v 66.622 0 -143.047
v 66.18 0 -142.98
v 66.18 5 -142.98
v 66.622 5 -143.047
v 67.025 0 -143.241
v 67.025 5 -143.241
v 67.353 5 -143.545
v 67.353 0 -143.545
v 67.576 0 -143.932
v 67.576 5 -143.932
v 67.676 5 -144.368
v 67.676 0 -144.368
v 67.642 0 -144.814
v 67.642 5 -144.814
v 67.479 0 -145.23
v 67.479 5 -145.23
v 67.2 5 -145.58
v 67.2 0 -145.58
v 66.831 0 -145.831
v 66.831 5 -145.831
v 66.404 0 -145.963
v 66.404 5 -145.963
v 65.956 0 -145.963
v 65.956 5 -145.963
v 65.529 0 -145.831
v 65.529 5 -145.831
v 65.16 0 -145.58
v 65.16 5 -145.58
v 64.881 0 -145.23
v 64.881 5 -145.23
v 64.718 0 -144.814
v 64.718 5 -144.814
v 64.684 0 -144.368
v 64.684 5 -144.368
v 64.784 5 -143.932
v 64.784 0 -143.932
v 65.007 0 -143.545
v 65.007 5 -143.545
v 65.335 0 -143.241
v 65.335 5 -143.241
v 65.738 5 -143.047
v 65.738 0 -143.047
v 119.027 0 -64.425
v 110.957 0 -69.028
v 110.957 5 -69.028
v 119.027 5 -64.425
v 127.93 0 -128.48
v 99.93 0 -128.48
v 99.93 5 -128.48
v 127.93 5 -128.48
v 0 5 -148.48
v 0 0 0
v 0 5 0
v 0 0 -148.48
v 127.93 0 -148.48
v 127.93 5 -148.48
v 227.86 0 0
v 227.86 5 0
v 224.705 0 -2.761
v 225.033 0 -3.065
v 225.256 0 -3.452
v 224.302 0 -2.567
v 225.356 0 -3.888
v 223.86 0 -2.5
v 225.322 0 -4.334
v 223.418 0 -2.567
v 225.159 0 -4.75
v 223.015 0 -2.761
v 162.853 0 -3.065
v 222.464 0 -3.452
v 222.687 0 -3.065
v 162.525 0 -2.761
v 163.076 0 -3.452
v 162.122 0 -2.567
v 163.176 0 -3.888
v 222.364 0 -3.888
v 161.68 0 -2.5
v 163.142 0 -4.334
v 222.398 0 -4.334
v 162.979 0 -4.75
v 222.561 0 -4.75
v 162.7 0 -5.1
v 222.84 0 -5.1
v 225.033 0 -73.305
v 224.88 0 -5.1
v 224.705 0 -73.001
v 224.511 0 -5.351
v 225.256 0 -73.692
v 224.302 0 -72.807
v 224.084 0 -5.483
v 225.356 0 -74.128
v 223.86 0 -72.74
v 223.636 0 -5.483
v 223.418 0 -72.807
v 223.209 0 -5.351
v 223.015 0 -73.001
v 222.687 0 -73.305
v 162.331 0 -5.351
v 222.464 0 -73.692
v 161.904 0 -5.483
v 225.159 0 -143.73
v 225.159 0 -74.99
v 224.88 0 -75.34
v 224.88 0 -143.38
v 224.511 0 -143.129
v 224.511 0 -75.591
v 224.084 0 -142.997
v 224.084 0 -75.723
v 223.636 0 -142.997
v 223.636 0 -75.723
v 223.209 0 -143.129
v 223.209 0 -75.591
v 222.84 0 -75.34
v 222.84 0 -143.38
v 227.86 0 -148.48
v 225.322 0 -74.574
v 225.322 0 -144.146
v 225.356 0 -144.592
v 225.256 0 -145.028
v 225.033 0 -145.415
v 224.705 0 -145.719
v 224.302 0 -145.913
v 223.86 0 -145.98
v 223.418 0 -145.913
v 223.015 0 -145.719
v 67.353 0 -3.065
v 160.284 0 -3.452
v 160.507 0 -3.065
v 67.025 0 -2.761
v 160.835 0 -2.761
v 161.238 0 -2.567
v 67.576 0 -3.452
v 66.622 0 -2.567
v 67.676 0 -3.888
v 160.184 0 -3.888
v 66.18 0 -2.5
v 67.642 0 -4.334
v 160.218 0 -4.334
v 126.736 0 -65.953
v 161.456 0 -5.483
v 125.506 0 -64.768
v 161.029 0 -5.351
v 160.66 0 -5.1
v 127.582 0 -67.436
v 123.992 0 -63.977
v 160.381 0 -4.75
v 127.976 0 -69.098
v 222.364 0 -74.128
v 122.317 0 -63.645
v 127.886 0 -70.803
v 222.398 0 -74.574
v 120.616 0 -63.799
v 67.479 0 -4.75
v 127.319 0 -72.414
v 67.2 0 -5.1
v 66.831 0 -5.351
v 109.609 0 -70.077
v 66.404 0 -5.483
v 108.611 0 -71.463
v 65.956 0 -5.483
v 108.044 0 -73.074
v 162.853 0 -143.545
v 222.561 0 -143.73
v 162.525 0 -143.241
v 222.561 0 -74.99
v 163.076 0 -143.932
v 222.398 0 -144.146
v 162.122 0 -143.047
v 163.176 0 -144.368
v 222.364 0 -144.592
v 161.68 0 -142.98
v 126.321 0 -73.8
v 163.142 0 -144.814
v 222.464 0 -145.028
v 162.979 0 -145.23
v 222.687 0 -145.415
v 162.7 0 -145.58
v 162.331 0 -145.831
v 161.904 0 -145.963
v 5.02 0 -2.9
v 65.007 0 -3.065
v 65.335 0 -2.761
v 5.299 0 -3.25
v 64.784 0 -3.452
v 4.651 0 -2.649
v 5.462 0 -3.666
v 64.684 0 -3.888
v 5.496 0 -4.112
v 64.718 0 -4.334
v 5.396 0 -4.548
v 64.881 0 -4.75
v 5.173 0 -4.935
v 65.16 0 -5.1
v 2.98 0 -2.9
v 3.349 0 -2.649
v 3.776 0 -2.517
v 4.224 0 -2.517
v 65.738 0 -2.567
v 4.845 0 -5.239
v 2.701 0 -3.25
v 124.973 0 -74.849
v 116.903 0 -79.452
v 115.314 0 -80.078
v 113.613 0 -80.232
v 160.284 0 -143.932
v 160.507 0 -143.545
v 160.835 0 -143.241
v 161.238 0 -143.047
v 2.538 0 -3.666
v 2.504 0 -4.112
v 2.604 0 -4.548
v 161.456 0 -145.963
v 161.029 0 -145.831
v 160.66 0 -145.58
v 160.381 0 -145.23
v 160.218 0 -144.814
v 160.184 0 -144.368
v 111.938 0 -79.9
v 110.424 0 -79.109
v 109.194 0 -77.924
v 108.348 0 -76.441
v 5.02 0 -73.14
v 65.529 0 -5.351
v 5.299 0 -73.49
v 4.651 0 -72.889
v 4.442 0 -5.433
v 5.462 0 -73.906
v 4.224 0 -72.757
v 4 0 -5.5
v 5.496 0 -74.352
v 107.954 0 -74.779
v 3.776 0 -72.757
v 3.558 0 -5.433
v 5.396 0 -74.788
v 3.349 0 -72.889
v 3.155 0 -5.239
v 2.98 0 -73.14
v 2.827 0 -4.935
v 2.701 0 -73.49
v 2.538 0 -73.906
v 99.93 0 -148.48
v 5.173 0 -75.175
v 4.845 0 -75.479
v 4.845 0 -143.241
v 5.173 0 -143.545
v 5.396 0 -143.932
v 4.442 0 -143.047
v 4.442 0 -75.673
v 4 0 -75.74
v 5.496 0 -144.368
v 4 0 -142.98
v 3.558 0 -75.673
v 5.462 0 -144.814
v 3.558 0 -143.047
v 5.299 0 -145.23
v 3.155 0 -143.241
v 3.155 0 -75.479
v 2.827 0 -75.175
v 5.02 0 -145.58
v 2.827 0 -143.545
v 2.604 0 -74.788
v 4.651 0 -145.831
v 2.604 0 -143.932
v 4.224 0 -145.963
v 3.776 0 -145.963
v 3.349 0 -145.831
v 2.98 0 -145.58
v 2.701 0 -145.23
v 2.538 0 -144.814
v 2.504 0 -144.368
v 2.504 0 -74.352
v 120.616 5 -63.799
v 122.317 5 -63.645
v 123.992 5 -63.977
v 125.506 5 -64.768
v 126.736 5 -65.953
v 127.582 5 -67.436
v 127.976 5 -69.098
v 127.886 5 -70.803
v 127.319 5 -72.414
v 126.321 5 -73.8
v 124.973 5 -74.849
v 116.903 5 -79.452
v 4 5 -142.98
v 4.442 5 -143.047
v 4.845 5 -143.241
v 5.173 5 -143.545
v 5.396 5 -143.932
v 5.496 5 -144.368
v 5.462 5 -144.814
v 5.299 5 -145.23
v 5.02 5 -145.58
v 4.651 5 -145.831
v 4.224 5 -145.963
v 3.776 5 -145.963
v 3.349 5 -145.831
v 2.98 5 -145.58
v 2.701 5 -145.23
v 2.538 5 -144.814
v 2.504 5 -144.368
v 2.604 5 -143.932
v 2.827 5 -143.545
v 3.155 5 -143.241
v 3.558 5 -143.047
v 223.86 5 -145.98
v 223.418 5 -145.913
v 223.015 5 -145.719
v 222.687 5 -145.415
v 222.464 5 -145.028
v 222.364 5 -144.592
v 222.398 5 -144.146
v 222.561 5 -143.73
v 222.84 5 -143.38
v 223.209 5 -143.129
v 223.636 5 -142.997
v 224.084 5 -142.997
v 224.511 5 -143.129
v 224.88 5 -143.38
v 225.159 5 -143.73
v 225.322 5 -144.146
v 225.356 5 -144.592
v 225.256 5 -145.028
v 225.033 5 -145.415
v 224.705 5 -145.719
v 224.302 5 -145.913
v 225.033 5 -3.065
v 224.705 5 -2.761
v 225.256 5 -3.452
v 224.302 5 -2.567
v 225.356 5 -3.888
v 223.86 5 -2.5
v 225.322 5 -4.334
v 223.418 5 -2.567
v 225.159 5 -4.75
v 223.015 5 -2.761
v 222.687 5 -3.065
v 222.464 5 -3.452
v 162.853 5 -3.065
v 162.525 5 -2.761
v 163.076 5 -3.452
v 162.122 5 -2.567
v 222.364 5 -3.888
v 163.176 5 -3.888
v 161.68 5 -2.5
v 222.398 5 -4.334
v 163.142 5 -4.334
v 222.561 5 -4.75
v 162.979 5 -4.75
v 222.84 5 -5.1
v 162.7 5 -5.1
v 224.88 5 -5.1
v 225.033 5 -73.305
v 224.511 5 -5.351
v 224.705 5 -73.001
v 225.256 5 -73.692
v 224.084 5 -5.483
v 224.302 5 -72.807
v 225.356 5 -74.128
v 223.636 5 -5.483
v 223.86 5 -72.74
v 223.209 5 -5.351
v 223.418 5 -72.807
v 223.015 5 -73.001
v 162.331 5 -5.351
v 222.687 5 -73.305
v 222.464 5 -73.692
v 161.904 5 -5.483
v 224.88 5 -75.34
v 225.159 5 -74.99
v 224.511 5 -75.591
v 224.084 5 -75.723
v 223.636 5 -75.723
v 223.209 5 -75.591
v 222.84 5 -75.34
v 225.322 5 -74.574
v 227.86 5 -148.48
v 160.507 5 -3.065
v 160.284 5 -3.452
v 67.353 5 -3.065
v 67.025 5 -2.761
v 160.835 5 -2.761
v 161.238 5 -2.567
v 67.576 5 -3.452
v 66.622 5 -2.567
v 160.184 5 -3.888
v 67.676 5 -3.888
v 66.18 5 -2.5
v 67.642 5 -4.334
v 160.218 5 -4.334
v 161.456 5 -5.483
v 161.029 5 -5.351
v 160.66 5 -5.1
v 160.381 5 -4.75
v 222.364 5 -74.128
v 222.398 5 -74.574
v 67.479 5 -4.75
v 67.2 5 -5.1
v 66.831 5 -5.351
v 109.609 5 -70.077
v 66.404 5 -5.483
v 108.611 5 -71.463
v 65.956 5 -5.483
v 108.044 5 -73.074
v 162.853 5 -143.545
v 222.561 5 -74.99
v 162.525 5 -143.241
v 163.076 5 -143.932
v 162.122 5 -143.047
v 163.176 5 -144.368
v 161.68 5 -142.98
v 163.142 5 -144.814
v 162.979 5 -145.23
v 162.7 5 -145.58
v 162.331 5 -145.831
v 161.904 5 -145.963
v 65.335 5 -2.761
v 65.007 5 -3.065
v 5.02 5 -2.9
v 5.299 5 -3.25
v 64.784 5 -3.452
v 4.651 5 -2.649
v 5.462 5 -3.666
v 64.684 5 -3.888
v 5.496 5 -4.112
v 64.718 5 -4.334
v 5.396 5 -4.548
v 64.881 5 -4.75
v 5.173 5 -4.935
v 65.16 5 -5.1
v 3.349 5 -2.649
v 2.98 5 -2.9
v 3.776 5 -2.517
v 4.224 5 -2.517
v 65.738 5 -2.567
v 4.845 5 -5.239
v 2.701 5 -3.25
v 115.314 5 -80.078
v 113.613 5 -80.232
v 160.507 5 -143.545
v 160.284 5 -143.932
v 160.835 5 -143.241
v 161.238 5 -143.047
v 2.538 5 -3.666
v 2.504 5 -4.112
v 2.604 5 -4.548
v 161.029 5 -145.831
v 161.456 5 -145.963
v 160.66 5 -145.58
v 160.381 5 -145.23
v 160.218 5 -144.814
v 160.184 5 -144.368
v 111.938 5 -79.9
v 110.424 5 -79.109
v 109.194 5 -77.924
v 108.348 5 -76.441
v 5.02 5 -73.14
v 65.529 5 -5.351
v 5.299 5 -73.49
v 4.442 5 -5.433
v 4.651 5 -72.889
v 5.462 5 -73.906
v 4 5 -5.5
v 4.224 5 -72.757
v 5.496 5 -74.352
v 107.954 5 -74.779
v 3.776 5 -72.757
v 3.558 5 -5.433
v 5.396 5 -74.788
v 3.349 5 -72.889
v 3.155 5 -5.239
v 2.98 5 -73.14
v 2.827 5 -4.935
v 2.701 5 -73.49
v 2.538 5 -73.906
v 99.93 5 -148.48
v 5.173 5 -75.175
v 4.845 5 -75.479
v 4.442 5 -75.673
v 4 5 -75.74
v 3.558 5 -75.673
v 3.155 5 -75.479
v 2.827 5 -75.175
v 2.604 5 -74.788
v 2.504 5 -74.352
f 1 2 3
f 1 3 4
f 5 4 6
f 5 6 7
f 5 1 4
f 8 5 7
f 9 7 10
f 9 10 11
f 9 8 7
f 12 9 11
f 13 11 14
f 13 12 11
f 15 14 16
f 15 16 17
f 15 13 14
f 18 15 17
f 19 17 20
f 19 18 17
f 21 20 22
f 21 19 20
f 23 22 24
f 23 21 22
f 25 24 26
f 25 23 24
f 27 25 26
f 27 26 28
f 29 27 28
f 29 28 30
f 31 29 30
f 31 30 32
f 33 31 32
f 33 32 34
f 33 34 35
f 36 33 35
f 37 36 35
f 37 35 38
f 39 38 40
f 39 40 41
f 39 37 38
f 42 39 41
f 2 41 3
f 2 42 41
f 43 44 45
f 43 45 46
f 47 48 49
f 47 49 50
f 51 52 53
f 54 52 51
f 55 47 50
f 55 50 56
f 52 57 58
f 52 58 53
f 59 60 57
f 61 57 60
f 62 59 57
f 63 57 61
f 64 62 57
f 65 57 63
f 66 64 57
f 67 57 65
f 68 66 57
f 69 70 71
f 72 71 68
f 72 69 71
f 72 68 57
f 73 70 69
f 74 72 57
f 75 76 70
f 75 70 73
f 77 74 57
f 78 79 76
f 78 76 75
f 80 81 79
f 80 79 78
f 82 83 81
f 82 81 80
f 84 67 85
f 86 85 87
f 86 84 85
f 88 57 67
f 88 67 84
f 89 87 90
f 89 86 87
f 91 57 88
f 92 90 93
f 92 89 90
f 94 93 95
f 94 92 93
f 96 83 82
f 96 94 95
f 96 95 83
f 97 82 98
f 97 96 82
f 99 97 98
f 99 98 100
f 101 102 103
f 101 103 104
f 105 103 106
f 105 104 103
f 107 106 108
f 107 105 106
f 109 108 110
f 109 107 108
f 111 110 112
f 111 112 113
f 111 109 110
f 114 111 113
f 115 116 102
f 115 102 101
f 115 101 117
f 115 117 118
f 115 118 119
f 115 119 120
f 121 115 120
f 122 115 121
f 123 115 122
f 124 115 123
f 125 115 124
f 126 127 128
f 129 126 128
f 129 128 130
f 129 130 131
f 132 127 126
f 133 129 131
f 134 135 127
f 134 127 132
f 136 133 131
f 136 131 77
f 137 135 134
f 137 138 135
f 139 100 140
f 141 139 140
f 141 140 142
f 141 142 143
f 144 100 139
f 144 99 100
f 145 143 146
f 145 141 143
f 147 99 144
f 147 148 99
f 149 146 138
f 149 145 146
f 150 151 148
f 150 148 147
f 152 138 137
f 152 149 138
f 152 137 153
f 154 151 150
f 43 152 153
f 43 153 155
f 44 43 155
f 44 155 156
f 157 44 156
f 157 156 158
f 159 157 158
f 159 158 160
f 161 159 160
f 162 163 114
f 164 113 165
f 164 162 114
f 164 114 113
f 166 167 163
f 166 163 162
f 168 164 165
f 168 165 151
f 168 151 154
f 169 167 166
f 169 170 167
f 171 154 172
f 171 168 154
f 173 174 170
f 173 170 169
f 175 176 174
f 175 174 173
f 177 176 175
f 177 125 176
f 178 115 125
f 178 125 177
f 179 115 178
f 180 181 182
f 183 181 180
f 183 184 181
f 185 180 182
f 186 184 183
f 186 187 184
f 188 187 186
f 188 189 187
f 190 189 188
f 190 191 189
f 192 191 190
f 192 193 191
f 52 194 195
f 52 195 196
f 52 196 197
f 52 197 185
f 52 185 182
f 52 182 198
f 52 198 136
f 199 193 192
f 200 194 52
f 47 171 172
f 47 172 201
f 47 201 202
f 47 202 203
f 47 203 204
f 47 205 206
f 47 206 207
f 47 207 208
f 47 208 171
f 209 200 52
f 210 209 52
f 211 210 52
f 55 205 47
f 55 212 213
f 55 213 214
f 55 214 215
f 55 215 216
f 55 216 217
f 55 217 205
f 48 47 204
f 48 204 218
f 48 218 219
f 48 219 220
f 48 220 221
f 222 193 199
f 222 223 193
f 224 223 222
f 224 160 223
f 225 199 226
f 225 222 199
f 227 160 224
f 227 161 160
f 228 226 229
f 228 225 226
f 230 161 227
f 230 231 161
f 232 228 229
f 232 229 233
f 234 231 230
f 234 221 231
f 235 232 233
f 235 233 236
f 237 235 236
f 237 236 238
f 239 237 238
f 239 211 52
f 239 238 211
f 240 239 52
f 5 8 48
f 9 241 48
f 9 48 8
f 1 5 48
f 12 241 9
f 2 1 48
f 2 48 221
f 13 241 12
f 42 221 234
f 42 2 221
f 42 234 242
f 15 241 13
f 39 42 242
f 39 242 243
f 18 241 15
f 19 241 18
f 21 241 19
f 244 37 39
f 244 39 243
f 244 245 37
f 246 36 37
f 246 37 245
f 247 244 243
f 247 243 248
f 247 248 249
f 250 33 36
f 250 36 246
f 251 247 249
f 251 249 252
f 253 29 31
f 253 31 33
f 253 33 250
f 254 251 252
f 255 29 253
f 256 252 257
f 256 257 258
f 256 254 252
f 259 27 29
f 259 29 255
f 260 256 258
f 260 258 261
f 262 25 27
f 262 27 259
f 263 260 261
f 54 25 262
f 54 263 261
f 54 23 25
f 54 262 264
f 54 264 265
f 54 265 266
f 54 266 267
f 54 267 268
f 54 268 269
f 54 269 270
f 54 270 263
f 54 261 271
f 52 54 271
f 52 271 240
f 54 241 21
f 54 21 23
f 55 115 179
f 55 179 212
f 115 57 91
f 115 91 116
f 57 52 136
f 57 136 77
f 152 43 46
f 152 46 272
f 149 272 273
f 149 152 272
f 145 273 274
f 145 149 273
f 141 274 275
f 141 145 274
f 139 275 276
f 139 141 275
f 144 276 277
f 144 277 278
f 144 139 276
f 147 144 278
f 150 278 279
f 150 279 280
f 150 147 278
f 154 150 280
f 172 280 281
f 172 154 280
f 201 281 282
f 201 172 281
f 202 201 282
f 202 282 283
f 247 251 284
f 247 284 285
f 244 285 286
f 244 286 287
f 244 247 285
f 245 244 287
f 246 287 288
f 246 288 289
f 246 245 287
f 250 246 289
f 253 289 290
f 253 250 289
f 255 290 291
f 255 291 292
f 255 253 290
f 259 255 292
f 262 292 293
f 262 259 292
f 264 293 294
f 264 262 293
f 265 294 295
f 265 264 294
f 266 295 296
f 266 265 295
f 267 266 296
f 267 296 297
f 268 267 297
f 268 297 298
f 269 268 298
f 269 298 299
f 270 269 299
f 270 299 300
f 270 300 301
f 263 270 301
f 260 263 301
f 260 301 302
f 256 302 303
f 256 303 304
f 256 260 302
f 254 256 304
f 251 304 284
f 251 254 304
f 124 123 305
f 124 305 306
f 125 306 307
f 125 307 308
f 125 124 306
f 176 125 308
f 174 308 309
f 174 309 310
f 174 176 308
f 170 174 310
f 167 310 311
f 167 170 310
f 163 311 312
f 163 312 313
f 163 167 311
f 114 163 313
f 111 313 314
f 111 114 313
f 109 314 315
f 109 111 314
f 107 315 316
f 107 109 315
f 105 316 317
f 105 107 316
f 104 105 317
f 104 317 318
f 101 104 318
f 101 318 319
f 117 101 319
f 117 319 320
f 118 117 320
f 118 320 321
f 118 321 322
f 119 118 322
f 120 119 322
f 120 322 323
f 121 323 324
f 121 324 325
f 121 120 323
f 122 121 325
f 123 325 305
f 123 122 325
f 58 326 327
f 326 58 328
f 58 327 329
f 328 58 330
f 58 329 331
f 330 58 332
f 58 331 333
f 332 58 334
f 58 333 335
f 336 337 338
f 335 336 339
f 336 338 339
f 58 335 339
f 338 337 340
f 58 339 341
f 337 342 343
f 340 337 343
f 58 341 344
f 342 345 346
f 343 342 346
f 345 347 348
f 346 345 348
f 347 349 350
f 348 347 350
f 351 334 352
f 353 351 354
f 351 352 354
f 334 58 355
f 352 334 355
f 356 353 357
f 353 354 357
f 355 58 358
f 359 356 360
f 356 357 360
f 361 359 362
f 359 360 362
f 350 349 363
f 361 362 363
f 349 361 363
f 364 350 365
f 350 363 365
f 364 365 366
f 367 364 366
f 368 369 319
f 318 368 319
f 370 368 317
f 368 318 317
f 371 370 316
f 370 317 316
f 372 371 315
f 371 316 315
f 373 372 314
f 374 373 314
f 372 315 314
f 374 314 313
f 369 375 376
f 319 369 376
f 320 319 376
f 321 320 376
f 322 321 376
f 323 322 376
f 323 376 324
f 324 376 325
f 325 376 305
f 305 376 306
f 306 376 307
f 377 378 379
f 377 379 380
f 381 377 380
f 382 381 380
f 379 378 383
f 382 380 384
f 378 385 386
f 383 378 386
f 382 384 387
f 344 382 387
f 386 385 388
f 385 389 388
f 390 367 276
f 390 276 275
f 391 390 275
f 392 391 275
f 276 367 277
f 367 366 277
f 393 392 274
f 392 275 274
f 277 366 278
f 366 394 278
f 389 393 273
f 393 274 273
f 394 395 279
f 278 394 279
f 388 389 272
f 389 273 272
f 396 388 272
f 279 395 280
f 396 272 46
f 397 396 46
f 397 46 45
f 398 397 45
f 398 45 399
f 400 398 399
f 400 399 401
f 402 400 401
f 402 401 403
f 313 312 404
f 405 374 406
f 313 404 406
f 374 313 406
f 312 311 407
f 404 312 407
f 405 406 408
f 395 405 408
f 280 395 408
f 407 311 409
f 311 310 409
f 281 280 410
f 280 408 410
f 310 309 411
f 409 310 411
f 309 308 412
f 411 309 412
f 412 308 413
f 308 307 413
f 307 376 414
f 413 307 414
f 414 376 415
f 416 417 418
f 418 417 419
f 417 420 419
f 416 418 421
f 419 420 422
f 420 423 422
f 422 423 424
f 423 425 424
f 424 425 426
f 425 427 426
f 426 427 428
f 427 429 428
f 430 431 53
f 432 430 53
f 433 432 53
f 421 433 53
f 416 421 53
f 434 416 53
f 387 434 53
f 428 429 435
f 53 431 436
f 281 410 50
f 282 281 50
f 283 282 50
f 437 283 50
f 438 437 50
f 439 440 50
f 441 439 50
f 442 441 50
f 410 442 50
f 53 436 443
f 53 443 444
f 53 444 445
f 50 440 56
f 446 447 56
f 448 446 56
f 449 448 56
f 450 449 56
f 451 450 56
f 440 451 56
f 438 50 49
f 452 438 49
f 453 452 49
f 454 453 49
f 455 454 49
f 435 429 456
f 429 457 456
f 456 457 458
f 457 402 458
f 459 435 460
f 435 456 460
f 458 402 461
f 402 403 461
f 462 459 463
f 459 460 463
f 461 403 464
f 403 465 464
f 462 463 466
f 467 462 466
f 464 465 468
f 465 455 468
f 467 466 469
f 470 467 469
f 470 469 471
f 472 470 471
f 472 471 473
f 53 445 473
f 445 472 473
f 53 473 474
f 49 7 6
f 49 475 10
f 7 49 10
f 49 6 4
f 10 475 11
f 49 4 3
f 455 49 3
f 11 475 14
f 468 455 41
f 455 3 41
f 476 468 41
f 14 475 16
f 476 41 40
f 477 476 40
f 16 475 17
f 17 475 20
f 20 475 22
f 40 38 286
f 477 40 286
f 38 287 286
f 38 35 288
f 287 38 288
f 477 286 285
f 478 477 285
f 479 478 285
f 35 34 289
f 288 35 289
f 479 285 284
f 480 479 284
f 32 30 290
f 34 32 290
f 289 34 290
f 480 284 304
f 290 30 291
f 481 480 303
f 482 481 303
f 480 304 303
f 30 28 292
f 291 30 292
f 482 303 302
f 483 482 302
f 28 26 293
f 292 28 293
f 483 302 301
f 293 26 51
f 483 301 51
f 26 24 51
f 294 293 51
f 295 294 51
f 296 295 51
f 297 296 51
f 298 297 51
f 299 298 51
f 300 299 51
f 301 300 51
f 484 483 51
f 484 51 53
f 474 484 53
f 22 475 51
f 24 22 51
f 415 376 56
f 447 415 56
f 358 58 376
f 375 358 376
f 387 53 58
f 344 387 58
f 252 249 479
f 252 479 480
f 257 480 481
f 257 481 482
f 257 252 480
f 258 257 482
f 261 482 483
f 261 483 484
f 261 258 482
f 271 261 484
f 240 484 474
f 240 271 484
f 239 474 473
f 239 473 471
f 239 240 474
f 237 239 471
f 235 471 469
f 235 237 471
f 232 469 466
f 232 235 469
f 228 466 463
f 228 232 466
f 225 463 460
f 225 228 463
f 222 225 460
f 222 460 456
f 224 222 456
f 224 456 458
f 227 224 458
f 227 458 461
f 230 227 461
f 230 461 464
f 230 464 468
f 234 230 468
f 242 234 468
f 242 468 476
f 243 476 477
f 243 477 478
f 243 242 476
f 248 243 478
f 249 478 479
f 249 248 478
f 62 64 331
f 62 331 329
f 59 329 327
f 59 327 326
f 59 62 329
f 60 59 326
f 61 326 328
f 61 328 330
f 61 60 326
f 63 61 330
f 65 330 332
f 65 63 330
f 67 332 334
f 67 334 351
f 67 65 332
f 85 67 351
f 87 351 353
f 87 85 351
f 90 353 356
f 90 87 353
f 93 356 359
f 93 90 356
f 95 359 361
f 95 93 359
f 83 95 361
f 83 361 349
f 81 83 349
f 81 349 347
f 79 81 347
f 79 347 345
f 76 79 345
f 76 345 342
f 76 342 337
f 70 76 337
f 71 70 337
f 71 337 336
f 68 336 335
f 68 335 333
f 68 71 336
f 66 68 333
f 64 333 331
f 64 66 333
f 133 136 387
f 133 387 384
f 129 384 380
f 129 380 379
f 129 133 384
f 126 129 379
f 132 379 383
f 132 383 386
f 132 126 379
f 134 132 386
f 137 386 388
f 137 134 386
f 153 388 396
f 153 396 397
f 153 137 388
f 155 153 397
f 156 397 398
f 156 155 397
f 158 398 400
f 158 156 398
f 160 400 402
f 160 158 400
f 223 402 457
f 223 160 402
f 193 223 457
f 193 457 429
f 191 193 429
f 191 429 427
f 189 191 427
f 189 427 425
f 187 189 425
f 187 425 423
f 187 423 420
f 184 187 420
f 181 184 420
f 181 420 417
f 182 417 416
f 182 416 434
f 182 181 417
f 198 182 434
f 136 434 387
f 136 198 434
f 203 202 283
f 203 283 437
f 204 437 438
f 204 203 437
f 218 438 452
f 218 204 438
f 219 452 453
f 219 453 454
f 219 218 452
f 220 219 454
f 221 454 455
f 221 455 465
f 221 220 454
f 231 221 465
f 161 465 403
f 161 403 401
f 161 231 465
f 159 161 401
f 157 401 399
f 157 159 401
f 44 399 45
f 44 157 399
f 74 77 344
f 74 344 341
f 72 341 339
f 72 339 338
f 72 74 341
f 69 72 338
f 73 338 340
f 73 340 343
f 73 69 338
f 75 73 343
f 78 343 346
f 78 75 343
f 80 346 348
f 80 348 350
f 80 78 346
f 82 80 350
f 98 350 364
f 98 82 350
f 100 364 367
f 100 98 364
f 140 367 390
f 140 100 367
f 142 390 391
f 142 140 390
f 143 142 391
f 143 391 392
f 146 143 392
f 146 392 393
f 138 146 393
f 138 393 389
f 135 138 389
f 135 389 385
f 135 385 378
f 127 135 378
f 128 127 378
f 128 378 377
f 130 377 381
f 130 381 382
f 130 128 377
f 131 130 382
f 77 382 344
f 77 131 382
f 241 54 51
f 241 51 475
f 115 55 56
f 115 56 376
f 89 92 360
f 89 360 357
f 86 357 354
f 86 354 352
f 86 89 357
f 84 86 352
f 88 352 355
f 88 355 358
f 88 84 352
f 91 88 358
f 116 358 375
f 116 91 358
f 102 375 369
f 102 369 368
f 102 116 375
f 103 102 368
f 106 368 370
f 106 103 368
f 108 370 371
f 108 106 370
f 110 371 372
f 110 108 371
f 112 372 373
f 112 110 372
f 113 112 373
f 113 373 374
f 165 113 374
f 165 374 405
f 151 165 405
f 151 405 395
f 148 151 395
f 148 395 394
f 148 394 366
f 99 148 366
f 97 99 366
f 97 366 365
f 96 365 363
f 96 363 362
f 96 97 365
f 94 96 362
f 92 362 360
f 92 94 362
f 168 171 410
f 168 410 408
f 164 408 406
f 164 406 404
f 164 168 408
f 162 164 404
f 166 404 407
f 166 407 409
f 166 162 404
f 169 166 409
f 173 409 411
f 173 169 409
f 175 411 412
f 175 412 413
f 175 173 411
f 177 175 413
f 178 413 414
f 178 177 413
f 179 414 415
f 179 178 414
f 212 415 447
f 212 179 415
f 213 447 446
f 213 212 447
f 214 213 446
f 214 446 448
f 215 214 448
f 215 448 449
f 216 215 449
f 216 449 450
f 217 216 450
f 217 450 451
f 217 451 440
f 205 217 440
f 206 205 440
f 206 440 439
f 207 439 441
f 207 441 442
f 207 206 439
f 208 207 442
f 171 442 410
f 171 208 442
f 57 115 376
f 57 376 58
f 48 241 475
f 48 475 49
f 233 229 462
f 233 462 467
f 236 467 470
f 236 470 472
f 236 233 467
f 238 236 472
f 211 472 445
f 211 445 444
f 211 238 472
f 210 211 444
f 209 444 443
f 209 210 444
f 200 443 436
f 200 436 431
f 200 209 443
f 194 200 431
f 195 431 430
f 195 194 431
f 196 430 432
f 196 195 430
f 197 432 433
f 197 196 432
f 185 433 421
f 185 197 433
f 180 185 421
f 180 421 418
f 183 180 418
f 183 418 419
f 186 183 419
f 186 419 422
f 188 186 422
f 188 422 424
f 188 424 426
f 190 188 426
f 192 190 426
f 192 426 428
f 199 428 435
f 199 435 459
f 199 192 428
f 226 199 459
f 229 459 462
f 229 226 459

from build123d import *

# Parameters (mm, degrees)
SKETCH1_R           = 1.5
BOSS_EXTRUDE1_DEPTH = 5


with BuildPart() as part:
    # Sketch1 → Boss-Extrude1 (new body)
    with BuildSketch(Plane(origin=(0, 0, 0), x_dir=(1, 0, 0), z_dir=(0, 1, 0))):
        Polygon((0, 0), (0, 148.48), (99.93, 148.48), (99.93, 128.48), (127.93, 128.48), (127.93, 148.48), (227.86, 148.48), (227.86, 0), align=None)
        with Locations(Location((223.86, 74.24, 0), (0, 0, 270))):
            Circle(SKETCH1_R, mode=Mode.SUBTRACT)
        with Locations(Location((4, 74.24, 0), (0, 0, 90))):
            Circle(SKETCH1_R, mode=Mode.SUBTRACT)
        with Locations(Location((66.18, 4, 0), (0, 0, 270))):
            Circle(SKETCH1_R, mode=Mode.SUBTRACT)
        with Locations(Location((161.68, 4, 0), (0, 0, 270))):
            Circle(SKETCH1_R, mode=Mode.SUBTRACT)
        with Locations(Location((161.68, 144.48, 0), (0, 0, 270))):
            Circle(SKETCH1_R, mode=Mode.SUBTRACT)
        with Locations(Location((66.18, 144.48, 0), (0, 0, 270))):
            Circle(SKETCH1_R, mode=Mode.SUBTRACT)
        with Locations(Location((223.86, 4, 0), (0, 0, 270))):
            Circle(SKETCH1_R, mode=Mode.SUBTRACT)
        with Locations(Location((4, 4, 0), (0, 0, 90))):
            Circle(SKETCH1_R, mode=Mode.SUBTRACT)
        with Locations(Location((4, 144.48, 0), (0, 0, 270))):
            Circle(SKETCH1_R, mode=Mode.SUBTRACT)
        with Locations(Location((223.86, 144.48, 0), (0, 0, 90))):
            Circle(SKETCH1_R, mode=Mode.SUBTRACT)
        with BuildLine():
            Line((124.972729238, 74.848802076), (116.902729238, 79.451802076))
            ThreePointArc((116.902729238, 79.451802076), (108.718197924, 77.212729238), (110.957270762, 69.028197924))
            Line((110.957270762, 69.028197924), (119.027270762, 64.425197924))
            ThreePointArc((119.027270762, 64.425197924), (127.211802076, 66.664270762), (124.972729238, 74.848802076))
        make_face(mode=Mode.SUBTRACT)
    extrude(amount=BOSS_EXTRUDE1_DEPTH)


solid = part.part
